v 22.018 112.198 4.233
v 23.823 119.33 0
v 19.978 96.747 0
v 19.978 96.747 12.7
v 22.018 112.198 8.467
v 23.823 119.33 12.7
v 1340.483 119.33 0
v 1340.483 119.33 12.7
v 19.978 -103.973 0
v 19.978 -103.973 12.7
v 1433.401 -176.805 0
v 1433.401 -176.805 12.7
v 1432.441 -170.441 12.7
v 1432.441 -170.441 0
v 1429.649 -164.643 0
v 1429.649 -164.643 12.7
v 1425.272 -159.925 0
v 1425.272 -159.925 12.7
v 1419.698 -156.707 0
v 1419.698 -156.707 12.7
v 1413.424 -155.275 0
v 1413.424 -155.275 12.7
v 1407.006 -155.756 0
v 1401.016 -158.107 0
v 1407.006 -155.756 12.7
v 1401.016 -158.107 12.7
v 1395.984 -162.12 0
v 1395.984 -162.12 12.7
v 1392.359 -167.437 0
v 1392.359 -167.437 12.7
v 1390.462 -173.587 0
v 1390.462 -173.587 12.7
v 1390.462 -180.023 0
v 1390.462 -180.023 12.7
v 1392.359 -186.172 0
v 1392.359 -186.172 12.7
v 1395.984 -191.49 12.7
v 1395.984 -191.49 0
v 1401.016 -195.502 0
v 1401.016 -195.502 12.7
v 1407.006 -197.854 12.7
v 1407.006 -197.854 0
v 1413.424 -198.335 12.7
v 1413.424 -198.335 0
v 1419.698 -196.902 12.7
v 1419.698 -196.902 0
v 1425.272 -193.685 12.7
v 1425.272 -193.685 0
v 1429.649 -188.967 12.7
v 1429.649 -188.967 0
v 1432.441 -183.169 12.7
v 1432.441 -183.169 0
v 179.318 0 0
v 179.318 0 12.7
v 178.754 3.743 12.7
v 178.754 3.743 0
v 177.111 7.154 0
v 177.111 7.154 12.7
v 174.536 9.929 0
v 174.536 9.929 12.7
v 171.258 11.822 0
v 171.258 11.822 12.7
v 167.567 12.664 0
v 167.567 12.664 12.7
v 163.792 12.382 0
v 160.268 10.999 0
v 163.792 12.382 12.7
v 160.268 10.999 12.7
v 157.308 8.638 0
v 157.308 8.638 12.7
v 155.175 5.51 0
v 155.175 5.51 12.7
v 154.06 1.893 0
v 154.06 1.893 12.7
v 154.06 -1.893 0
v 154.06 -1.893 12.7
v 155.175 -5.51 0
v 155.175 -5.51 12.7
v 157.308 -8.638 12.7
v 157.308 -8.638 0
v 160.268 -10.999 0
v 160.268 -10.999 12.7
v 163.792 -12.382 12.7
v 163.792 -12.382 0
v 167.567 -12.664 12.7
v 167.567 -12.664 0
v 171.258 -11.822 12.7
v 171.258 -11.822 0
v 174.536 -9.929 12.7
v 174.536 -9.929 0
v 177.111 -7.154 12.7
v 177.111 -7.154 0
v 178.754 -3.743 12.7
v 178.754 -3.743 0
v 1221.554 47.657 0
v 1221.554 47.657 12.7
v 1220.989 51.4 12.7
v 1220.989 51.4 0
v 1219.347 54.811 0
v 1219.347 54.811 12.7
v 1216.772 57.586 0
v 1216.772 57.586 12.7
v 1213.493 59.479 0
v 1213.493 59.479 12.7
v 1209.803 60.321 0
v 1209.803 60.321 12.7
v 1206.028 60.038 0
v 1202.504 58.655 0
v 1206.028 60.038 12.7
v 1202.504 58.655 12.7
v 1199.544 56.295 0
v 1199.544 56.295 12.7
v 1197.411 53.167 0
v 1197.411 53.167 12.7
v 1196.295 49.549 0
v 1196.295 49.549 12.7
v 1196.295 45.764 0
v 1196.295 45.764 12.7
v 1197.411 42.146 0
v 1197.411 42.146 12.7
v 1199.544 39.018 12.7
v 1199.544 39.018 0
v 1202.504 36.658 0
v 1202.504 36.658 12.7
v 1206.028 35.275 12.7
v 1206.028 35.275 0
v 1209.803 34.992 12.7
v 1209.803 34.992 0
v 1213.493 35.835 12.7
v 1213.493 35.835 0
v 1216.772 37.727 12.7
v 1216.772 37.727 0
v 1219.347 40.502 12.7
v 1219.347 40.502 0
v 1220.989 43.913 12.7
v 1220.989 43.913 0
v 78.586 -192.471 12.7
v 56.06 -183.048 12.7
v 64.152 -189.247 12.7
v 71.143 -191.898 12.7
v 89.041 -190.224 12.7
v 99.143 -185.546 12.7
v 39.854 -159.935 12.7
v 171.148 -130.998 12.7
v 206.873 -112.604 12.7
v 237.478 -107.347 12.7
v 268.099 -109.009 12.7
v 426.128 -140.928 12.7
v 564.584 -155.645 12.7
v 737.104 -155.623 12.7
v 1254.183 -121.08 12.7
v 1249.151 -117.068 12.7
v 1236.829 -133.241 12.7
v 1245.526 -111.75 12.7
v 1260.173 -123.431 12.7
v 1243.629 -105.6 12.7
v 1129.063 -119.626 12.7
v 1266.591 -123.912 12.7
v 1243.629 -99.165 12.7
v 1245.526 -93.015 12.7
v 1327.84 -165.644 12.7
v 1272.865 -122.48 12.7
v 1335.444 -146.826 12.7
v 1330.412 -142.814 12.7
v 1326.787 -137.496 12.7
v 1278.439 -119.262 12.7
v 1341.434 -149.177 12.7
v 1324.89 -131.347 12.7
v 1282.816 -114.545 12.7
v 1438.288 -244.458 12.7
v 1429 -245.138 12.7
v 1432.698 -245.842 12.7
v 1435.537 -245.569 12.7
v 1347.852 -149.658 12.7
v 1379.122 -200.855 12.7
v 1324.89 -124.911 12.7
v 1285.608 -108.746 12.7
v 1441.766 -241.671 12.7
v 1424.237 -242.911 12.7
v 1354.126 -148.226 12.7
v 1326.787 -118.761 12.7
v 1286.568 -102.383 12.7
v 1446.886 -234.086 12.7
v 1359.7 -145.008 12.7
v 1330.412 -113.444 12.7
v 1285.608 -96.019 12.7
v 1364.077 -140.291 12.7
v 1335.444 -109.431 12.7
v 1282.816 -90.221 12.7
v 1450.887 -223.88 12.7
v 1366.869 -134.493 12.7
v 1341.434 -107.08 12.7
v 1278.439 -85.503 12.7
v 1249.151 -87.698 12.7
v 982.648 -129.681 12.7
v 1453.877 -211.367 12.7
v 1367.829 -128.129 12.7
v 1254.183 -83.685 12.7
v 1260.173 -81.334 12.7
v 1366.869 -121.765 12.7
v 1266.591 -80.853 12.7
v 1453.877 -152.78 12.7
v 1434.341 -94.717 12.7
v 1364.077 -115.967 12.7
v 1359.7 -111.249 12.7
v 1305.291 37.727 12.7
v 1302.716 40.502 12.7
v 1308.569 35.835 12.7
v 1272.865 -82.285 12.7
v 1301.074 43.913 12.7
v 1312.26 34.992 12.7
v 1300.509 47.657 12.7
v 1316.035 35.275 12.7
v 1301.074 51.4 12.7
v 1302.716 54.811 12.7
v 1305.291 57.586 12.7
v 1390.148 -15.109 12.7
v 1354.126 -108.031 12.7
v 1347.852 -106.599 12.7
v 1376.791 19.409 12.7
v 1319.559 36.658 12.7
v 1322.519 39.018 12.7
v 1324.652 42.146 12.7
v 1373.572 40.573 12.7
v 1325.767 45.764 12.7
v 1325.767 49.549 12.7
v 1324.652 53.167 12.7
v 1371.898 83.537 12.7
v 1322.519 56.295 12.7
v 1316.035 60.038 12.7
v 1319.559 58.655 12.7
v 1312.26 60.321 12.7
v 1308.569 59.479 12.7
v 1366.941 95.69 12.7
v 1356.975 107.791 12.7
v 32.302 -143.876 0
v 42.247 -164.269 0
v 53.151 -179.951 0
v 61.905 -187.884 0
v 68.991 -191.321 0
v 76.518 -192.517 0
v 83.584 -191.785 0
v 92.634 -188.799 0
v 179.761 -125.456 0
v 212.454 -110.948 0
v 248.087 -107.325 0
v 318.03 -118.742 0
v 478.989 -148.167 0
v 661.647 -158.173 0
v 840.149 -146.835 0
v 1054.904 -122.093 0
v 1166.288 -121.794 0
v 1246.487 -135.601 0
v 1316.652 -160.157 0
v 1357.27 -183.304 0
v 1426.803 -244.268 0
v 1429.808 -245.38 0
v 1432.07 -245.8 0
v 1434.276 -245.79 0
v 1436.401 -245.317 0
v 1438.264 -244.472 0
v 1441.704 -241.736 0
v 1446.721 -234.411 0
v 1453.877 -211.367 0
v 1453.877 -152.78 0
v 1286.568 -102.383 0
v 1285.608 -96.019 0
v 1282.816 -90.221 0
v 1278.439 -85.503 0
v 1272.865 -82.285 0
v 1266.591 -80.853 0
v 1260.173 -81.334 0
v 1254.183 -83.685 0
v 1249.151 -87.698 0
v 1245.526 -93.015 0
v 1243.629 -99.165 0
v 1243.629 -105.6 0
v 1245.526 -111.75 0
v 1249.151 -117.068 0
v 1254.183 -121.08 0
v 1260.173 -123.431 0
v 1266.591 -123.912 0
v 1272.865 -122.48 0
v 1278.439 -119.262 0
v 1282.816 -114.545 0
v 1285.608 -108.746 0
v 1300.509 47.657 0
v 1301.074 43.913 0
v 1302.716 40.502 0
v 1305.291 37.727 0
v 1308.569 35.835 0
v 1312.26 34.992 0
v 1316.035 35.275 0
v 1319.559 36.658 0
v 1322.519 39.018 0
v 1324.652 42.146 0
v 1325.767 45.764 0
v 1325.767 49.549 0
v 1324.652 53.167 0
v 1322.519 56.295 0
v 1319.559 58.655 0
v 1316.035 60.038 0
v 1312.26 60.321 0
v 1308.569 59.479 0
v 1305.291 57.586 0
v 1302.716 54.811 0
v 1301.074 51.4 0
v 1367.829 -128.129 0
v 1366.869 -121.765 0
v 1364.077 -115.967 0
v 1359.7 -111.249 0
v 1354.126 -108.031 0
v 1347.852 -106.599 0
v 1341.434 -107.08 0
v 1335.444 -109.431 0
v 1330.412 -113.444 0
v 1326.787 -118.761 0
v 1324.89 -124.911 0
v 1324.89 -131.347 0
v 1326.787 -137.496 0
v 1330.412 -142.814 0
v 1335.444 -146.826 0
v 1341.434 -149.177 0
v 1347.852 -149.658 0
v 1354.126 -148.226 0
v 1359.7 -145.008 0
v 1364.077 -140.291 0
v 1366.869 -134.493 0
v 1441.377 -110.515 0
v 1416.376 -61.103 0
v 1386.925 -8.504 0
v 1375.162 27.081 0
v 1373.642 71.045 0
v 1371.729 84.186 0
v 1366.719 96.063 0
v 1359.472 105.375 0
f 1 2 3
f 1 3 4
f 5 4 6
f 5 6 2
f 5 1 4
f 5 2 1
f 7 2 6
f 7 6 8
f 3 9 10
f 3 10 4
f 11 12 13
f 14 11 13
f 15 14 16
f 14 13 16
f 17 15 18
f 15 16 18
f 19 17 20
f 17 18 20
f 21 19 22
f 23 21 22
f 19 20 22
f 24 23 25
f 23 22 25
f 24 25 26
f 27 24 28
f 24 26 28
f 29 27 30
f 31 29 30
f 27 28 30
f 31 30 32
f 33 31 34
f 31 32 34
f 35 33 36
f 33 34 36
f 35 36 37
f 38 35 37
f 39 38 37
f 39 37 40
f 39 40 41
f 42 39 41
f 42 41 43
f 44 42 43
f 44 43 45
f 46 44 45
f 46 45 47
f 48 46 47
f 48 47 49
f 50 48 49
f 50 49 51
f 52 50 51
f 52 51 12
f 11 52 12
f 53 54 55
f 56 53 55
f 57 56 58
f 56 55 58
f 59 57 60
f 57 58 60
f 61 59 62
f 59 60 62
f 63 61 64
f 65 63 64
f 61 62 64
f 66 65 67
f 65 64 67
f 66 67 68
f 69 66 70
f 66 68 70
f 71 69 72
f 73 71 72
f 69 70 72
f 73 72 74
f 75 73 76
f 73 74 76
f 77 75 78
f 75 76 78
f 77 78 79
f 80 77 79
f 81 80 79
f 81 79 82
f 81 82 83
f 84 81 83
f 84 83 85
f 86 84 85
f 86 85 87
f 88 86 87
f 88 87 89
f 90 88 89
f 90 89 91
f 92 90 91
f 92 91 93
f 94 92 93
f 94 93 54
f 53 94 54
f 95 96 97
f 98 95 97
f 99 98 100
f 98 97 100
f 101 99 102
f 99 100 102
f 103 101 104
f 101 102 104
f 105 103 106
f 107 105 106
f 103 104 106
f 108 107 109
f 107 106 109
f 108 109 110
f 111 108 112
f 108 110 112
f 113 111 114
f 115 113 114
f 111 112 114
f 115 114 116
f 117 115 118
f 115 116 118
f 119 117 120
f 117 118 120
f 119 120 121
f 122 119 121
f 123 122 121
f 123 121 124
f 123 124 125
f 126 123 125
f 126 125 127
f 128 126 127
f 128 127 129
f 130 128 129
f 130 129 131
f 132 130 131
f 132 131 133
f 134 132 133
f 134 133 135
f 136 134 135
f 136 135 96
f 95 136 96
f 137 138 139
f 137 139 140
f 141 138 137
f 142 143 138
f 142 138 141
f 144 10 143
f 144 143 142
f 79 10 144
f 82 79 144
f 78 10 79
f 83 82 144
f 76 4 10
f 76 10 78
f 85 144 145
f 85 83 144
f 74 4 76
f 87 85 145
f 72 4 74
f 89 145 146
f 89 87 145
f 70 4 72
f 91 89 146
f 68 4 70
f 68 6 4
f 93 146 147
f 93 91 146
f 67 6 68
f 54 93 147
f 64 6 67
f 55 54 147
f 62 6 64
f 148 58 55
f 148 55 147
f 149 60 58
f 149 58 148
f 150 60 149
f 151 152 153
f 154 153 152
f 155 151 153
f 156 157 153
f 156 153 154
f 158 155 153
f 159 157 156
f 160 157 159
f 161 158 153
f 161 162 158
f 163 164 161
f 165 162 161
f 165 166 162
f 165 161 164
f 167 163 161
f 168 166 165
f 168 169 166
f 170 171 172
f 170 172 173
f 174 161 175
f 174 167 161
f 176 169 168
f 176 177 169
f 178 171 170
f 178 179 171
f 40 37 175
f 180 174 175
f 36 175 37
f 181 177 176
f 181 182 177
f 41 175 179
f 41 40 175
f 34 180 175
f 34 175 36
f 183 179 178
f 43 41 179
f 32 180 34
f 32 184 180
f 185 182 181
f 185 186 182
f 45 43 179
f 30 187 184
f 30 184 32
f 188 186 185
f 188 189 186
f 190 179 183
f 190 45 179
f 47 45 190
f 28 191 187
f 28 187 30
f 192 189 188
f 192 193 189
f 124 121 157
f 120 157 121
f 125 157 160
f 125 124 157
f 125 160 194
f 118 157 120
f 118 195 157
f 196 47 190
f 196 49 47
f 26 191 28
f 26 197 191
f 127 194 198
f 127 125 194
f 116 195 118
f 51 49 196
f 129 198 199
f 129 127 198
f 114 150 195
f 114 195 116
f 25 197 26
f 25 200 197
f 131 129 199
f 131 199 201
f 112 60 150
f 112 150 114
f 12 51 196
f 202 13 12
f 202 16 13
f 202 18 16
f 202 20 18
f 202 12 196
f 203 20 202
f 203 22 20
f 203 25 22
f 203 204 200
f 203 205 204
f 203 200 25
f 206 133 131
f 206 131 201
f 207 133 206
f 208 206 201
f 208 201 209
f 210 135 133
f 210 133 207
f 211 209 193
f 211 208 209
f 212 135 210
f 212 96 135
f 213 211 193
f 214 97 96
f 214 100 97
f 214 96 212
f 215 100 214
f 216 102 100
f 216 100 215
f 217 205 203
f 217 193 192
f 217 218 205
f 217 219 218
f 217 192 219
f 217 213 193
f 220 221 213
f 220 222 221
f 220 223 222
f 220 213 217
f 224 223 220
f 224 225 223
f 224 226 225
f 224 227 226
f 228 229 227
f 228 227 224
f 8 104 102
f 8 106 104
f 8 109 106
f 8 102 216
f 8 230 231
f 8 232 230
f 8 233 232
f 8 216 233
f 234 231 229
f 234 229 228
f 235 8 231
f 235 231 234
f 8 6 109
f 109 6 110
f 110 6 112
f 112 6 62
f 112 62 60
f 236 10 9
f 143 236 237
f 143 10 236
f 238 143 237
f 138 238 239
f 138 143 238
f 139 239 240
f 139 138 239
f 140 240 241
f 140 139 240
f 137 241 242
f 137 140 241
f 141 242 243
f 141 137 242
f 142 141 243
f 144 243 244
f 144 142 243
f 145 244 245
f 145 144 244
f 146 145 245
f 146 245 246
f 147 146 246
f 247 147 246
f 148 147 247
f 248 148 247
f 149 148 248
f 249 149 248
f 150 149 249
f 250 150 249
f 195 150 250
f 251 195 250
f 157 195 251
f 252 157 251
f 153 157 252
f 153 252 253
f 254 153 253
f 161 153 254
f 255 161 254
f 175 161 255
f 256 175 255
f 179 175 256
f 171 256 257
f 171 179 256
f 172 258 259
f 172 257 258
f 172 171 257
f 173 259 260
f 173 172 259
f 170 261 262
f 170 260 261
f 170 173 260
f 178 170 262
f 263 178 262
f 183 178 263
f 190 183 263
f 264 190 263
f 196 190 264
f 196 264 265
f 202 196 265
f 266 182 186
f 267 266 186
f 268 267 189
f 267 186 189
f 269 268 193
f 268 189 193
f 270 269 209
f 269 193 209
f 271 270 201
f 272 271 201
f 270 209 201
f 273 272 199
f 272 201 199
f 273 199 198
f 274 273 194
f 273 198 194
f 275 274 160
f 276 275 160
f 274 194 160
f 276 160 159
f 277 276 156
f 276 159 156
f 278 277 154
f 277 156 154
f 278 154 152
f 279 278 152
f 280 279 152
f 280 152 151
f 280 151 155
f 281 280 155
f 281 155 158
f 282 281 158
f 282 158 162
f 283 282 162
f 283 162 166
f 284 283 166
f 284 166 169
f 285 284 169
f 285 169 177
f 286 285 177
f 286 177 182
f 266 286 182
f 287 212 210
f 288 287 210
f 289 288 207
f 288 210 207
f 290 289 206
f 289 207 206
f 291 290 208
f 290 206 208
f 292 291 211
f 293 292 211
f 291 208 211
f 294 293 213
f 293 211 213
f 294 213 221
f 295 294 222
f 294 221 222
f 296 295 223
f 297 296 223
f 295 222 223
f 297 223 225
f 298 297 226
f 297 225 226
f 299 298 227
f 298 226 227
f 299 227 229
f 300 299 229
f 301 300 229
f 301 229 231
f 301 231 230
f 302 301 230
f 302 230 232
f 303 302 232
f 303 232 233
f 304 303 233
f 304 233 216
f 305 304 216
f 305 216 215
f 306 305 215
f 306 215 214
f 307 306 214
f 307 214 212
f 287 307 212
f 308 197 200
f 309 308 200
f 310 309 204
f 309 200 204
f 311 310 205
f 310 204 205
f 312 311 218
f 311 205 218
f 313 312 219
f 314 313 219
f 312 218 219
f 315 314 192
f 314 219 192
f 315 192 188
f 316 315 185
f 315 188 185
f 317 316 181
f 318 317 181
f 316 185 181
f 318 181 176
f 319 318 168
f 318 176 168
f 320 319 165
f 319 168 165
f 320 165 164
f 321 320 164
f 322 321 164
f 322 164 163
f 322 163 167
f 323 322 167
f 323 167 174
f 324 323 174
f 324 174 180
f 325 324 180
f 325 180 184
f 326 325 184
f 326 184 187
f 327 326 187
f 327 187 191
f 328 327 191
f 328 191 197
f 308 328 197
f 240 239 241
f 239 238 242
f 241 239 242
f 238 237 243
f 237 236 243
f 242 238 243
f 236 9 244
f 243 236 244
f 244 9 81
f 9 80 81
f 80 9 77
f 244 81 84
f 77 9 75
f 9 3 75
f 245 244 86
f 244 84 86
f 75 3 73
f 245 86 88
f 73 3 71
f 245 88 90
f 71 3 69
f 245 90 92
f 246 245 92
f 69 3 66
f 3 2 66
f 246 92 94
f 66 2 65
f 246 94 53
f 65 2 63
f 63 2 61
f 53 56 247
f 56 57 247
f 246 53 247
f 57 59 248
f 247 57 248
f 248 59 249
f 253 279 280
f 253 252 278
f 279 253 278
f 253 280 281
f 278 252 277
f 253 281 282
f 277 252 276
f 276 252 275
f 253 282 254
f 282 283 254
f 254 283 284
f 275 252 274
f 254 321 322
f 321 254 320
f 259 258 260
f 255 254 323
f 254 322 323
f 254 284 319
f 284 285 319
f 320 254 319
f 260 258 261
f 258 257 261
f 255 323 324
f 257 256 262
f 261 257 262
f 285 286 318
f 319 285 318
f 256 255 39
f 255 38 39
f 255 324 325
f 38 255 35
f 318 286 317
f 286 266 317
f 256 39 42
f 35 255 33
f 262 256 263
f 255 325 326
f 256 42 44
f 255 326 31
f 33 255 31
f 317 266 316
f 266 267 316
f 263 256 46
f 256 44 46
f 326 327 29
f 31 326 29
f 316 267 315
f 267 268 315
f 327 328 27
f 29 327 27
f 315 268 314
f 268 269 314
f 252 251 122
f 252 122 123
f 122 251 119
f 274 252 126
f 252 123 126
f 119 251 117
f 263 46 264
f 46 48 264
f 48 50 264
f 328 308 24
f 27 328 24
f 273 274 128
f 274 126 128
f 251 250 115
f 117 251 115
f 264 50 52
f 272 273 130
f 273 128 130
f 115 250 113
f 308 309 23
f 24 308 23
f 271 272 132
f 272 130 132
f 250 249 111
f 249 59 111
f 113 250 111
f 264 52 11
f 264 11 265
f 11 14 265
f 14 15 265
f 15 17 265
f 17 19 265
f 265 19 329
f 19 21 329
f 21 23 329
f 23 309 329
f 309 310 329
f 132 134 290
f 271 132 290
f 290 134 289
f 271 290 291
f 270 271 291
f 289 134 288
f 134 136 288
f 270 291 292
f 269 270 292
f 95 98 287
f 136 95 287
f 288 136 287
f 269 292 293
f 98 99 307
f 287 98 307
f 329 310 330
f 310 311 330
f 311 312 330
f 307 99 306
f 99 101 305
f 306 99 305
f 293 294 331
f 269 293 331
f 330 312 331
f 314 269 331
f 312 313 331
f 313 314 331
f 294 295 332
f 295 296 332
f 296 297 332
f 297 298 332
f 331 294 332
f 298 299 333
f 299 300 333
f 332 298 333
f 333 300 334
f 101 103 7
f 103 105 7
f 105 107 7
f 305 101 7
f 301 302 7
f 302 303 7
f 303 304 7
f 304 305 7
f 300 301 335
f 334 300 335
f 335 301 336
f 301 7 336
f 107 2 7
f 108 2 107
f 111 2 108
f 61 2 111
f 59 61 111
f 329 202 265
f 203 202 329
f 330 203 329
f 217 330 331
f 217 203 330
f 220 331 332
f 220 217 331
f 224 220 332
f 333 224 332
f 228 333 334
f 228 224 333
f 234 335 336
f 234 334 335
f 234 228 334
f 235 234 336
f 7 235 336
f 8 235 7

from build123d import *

# Parameters (mm, degrees)
F0_W     = 1433.8989723474
F0_H     = 383.8273435831
F1_DEPTH = 12.7
F3_DEPTH = 12.701
F4_R     = 12.7
F5_DEPTH = 25.4
F6_R     = 21.59
F7_DEPTH = 12.7010001


with BuildPart() as f1:
    # F0 (on Top) → F1 (new body)
    with BuildSketch(Plane.XY):
        with Locations((736.9271283969, -72.5835487247)):
            Rectangle(F0_W, F0_H)
    extrude(amount=F1_DEPTH)

    # F2 (on face) → F3 (cut, through all)
    with BuildSketch(Plane.XY.offset(12.7)):
        with BuildLine():
            add(Edge.make_bspline(
                [(23.8233897985, 119.3301230669), (21.6565458101, 112.3890118703), (20.6756031882, 104.8809228493), (19.9776422232, 96.7474654317)],
                knots=[0.0325304406, 0.0325304406, 0.0325304406, 0.0325304406, 0.044354018, 0.044354018, 0.044354018, 0.044354018], degree=3))
            Line((23.8233897985, 119.3301230669), (19.9776422232, 119.3301230669))
            Line((19.9776422232, 119.3301230669), (19.9776422232, 96.7474654317))
        make_face()
        with BuildLine():
            Line((1453.8766145706, 119.3301230669), (1340.4833078385, 119.3301230669))
            add(Edge.make_bspline(
                [(1453.8766145706, -152.7797728777), (1444.8861721142, -100.0066257216), (1386.4830680217, -21.8819630361), (1367.5935234806, 47.5566795571), (1379.6596673526, 97.7256977198), (1340.4833078384, 119.3301230669)],
                knots=[0.7069290309, 0.7069290309, 0.7069290309, 0.7069290309, 0.76224488, 0.7996241078, 0.8396558499, 0.8396558499, 0.8396558499, 0.8396558499], degree=3))
            Line((1453.8766145706, -152.7797728777), (1453.8766145706, 119.3301230669))
        make_face()
        with BuildLine():
            add(Edge.make_bspline(
                [(1453.8766145707, -211.3673318743), (1456.9659425303, -194.3252836531), (1457.3377944757, -173.0966101579), (1453.8766145706, -152.7797728777)],
                knots=[0.6856332931, 0.6856332931, 0.6856332931, 0.6856332931, 0.7069290309, 0.7069290309, 0.7069290309, 0.7069290309], degree=3))
            Line((1453.8766145706, -152.7797728777), (1453.8766145706, -211.3673318743))
        make_face()
        with BuildLine():
            Line((1453.8766145706, -264.4972205162), (1453.8766145706, -211.3673318743))
            add(Edge.make_bspline(
                [(19.9776422232, -103.9730086923), (24.3756687382, -128.300707788), (53.9404162103, -207.3482977869), (118.18563376, -180.1775685975), (208.841378416, -83.5676493307), (375.0429052781, -141.2900206769), (687.6951980634, -171.8723737776), (994.404795869, -125.2501516946), (1179.2519608483, -111.4952047309), (1368.4012079058, -167.4873842097), (1432.3799684146, -267.8037059643), (1450.5861550866, -229.5189072101), (1453.8766145707, -211.3673318743)],
                knots=[0.1521586148, 0.1521586148, 0.1521586148, 0.1521586148, 0.1959270808, 0.2281980685, 0.2773216753, 0.3343115246, 0.4155599093, 0.4955701148, 0.5575423121, 0.6208385182, 0.6629510906, 0.6856332931, 0.6856332931, 0.6856332931, 0.6856332931], degree=3))
            Line((19.9776422232, -103.9730086922), (19.9776422232, -264.4972205162))
            Line((19.9776422232, -264.4972205162), (1453.8766145706, -264.4972205162))
        make_face()
    extrude(amount=-F3_DEPTH, mode=Mode.SUBTRACT)

    # F4 (on face) → F5 (cut)
    with BuildSketch(Plane.XY.offset(12.7)):
        with Locations((166.6177362204, 0)):
            Circle(F4_R)
        with BuildLine():
            Line((1221.5536024094, 47.6566180587), (1196.1536024094, 47.6566180587))
            ThreePointArc((1196.1536024094, 47.6566180587), (1208.8536024094, 34.9566180587), (1221.5536024094, 47.6566180587))
        make_face()
        with BuildLine():
            ThreePointArc((1221.5536024094, 47.6566180587), (1208.8536024094, 60.3566180587), (1196.1536024094, 47.6566180587))
            Line((1196.1536024094, 47.6566180587), (1221.5536024094, 47.6566180587))
        make_face()
        with BuildLine():
            ThreePointArc((1325.9092952728, 47.6566180587), (1313.2092952728, 60.3566180587), (1300.5092952728, 47.6566180587))
            ThreePointArc((1300.5092952728, 47.6566180587), (1313.2092952728, 34.9566180587), (1325.9092952728, 47.6566180587))
        make_face()
    extrude(amount=-F5_DEPTH, mode=Mode.SUBTRACT)

    # F6 (on face) → F7 (cut, through all)
    with BuildSketch(Plane.XY.offset(12.7)):
        with Locations((1411.8106365204, -176.8049150705)):
            Circle(F6_R)
        with Locations((1346.2386131287, -128.1287372112)):
            Circle(F6_R)
        with Locations((1264.9775743484, -102.3826450109)):
            Circle(F6_R)
    extrude(amount=-F7_DEPTH, mode=Mode.SUBTRACT)


solid = f1.part
